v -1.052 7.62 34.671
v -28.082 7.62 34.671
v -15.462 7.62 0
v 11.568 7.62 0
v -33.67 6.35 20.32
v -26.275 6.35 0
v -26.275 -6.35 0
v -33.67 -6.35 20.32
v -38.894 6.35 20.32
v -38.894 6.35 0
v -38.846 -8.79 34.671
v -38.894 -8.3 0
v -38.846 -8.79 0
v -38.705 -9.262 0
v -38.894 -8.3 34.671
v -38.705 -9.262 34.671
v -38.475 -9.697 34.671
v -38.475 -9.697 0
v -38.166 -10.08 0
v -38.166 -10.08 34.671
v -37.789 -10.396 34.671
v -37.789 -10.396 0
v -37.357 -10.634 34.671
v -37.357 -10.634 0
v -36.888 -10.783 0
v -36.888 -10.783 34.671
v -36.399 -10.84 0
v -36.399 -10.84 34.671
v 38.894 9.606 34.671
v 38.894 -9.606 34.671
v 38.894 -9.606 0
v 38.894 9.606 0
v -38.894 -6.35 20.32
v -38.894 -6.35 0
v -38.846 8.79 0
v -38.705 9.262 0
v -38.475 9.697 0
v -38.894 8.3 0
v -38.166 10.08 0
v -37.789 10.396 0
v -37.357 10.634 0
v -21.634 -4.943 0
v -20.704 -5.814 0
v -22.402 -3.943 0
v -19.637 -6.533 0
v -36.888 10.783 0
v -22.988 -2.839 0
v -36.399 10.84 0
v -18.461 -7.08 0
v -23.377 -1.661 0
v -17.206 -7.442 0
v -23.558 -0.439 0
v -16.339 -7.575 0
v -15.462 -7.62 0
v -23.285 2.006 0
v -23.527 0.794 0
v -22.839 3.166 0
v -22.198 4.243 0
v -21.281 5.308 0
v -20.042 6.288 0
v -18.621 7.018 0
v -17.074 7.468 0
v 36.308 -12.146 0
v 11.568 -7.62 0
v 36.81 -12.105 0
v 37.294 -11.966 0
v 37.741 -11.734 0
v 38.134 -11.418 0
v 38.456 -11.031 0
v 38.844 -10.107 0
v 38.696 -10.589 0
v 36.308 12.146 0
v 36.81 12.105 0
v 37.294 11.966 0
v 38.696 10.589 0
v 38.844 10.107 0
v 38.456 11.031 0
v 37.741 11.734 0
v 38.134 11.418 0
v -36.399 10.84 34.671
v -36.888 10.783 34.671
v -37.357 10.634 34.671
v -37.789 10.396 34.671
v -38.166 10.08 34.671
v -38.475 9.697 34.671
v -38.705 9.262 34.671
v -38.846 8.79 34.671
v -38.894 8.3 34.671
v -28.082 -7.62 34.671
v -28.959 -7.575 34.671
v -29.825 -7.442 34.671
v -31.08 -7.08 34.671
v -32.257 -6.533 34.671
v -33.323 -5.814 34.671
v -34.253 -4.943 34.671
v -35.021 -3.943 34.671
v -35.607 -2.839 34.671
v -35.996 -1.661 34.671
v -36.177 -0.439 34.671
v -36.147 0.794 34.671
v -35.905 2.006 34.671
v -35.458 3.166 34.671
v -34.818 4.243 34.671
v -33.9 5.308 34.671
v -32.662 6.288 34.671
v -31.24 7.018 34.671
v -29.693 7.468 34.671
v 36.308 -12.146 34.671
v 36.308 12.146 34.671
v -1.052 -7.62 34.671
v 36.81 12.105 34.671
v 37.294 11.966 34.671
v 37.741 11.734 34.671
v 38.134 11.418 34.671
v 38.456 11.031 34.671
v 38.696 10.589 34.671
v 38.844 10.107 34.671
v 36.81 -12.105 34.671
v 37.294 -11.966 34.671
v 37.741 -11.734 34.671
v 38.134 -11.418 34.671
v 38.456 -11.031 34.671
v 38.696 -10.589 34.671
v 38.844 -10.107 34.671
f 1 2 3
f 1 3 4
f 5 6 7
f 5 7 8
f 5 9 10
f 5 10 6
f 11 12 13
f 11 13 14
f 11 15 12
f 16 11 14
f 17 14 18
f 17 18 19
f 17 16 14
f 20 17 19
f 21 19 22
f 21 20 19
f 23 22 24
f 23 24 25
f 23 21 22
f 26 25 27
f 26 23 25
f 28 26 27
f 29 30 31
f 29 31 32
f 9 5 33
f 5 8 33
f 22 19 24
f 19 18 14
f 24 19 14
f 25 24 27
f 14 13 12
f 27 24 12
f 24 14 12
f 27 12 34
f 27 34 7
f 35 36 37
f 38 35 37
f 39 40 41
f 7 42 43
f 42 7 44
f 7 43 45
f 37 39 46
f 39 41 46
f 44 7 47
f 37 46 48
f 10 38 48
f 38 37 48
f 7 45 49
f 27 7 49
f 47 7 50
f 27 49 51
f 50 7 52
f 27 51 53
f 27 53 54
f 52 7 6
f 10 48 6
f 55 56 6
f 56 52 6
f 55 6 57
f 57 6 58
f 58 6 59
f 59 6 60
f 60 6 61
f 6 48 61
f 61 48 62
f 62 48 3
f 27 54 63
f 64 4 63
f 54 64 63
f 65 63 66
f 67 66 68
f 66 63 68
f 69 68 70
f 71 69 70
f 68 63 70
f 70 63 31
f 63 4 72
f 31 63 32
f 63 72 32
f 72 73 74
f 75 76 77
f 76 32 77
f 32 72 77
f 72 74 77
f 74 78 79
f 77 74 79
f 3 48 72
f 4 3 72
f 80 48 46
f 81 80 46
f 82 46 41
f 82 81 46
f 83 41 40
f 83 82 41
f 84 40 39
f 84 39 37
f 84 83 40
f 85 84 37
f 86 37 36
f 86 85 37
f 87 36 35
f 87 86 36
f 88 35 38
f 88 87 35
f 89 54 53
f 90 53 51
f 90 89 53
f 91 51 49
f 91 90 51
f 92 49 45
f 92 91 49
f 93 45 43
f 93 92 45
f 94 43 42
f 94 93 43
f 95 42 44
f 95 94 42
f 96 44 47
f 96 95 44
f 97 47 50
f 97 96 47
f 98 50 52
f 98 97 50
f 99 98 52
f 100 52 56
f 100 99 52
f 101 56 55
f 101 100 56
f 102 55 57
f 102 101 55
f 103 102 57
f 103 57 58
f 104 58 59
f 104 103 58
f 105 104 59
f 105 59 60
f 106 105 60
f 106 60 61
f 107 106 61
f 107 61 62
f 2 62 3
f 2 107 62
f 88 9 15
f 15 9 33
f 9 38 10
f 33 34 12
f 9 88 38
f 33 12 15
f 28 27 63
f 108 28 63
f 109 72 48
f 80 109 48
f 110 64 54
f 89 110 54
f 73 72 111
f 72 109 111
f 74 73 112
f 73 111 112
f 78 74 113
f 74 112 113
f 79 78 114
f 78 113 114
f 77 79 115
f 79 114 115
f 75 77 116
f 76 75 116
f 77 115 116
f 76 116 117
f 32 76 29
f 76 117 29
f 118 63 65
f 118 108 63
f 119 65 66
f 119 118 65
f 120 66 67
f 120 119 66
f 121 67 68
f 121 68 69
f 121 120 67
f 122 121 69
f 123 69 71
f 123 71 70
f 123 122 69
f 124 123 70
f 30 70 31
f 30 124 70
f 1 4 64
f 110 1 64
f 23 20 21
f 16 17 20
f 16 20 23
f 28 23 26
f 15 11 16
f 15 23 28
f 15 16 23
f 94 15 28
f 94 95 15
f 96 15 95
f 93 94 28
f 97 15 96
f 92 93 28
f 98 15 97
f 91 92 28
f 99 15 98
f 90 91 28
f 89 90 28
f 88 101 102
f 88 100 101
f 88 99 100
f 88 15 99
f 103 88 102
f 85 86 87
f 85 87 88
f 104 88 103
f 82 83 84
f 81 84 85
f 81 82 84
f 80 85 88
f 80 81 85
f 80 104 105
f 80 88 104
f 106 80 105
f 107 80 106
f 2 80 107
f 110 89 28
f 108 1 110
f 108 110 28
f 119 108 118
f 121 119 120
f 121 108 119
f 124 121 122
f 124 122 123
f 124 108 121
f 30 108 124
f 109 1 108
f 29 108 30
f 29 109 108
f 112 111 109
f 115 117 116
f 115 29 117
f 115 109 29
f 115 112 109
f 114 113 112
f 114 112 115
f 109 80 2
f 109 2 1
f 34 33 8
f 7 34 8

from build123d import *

# Parameters (mm, degrees)
F1_DEPTH      = 34.671
F2_R          = 2.54
F5_DEPTH      = 59.1859747542
F7_DEPTH      = 6.35
F7_DEPTH_BACK = 6.35


with BuildPart() as f1:
    # F0 (on Top) → F1 (new body)
    with BuildSketch(Plane.XY):
        Polygon((38.89375, 12.192), (-38.89375, 10.795), (-38.89375, -10.795), (38.89375, -12.192), align=None)
    extrude(amount=F1_DEPTH)

    # F2
    f2_edges = [f1.edges().sort_by_distance(p)[0] for p in [
        (-38.89375, -10.795, 17.3355),
        (-38.89375, 10.795, 17.3355),
        (38.89375, -12.192, 17.3355),
        (38.89375, 12.192, 17.3355),
    ]]
    fillet(f2_edges, radius=F2_R)

    # F4 (on face) → F5 (cut, through all)
    with BuildSketch(Plane(origin=(-15.6927490779, 0, 43.1154737408), x_dir=(0.9396926208, 0, 0.3420201433), z_dir=(0.3420201433, 0, -0.9396926208))):
        with BuildLine():
            Line((10.8700105196, 7.62), (-14.5299894804, 7.62))
            ThreePointArc((-14.5299894804, 7.62), (-22.1499894804, 0), (-14.5299894804, -7.62))
            Line((-14.5299894804, -7.62), (10.8700105196, -7.62))
            Line((10.8700105196, -7.62), (10.8700105196, 7.62))
        make_face()
    extrude(amount=F5_DEPTH, mode=Mode.SUBTRACT)

    # F6 (on Front) → F7 (cut, two sides)
    with BuildSketch(Plane.XZ) as f7_sk:
        Polygon((-36.3993589719, 0), (-26.2745380078, 0), (-33.670413168, 20.32), (-38.89375, 20.32), (-38.89375, 0), align=None)
    extrude(amount=-F7_DEPTH, mode=Mode.SUBTRACT)
    extrude(f7_sk.sketch, amount=F7_DEPTH_BACK, mode=Mode.SUBTRACT)


solid = f1.part
